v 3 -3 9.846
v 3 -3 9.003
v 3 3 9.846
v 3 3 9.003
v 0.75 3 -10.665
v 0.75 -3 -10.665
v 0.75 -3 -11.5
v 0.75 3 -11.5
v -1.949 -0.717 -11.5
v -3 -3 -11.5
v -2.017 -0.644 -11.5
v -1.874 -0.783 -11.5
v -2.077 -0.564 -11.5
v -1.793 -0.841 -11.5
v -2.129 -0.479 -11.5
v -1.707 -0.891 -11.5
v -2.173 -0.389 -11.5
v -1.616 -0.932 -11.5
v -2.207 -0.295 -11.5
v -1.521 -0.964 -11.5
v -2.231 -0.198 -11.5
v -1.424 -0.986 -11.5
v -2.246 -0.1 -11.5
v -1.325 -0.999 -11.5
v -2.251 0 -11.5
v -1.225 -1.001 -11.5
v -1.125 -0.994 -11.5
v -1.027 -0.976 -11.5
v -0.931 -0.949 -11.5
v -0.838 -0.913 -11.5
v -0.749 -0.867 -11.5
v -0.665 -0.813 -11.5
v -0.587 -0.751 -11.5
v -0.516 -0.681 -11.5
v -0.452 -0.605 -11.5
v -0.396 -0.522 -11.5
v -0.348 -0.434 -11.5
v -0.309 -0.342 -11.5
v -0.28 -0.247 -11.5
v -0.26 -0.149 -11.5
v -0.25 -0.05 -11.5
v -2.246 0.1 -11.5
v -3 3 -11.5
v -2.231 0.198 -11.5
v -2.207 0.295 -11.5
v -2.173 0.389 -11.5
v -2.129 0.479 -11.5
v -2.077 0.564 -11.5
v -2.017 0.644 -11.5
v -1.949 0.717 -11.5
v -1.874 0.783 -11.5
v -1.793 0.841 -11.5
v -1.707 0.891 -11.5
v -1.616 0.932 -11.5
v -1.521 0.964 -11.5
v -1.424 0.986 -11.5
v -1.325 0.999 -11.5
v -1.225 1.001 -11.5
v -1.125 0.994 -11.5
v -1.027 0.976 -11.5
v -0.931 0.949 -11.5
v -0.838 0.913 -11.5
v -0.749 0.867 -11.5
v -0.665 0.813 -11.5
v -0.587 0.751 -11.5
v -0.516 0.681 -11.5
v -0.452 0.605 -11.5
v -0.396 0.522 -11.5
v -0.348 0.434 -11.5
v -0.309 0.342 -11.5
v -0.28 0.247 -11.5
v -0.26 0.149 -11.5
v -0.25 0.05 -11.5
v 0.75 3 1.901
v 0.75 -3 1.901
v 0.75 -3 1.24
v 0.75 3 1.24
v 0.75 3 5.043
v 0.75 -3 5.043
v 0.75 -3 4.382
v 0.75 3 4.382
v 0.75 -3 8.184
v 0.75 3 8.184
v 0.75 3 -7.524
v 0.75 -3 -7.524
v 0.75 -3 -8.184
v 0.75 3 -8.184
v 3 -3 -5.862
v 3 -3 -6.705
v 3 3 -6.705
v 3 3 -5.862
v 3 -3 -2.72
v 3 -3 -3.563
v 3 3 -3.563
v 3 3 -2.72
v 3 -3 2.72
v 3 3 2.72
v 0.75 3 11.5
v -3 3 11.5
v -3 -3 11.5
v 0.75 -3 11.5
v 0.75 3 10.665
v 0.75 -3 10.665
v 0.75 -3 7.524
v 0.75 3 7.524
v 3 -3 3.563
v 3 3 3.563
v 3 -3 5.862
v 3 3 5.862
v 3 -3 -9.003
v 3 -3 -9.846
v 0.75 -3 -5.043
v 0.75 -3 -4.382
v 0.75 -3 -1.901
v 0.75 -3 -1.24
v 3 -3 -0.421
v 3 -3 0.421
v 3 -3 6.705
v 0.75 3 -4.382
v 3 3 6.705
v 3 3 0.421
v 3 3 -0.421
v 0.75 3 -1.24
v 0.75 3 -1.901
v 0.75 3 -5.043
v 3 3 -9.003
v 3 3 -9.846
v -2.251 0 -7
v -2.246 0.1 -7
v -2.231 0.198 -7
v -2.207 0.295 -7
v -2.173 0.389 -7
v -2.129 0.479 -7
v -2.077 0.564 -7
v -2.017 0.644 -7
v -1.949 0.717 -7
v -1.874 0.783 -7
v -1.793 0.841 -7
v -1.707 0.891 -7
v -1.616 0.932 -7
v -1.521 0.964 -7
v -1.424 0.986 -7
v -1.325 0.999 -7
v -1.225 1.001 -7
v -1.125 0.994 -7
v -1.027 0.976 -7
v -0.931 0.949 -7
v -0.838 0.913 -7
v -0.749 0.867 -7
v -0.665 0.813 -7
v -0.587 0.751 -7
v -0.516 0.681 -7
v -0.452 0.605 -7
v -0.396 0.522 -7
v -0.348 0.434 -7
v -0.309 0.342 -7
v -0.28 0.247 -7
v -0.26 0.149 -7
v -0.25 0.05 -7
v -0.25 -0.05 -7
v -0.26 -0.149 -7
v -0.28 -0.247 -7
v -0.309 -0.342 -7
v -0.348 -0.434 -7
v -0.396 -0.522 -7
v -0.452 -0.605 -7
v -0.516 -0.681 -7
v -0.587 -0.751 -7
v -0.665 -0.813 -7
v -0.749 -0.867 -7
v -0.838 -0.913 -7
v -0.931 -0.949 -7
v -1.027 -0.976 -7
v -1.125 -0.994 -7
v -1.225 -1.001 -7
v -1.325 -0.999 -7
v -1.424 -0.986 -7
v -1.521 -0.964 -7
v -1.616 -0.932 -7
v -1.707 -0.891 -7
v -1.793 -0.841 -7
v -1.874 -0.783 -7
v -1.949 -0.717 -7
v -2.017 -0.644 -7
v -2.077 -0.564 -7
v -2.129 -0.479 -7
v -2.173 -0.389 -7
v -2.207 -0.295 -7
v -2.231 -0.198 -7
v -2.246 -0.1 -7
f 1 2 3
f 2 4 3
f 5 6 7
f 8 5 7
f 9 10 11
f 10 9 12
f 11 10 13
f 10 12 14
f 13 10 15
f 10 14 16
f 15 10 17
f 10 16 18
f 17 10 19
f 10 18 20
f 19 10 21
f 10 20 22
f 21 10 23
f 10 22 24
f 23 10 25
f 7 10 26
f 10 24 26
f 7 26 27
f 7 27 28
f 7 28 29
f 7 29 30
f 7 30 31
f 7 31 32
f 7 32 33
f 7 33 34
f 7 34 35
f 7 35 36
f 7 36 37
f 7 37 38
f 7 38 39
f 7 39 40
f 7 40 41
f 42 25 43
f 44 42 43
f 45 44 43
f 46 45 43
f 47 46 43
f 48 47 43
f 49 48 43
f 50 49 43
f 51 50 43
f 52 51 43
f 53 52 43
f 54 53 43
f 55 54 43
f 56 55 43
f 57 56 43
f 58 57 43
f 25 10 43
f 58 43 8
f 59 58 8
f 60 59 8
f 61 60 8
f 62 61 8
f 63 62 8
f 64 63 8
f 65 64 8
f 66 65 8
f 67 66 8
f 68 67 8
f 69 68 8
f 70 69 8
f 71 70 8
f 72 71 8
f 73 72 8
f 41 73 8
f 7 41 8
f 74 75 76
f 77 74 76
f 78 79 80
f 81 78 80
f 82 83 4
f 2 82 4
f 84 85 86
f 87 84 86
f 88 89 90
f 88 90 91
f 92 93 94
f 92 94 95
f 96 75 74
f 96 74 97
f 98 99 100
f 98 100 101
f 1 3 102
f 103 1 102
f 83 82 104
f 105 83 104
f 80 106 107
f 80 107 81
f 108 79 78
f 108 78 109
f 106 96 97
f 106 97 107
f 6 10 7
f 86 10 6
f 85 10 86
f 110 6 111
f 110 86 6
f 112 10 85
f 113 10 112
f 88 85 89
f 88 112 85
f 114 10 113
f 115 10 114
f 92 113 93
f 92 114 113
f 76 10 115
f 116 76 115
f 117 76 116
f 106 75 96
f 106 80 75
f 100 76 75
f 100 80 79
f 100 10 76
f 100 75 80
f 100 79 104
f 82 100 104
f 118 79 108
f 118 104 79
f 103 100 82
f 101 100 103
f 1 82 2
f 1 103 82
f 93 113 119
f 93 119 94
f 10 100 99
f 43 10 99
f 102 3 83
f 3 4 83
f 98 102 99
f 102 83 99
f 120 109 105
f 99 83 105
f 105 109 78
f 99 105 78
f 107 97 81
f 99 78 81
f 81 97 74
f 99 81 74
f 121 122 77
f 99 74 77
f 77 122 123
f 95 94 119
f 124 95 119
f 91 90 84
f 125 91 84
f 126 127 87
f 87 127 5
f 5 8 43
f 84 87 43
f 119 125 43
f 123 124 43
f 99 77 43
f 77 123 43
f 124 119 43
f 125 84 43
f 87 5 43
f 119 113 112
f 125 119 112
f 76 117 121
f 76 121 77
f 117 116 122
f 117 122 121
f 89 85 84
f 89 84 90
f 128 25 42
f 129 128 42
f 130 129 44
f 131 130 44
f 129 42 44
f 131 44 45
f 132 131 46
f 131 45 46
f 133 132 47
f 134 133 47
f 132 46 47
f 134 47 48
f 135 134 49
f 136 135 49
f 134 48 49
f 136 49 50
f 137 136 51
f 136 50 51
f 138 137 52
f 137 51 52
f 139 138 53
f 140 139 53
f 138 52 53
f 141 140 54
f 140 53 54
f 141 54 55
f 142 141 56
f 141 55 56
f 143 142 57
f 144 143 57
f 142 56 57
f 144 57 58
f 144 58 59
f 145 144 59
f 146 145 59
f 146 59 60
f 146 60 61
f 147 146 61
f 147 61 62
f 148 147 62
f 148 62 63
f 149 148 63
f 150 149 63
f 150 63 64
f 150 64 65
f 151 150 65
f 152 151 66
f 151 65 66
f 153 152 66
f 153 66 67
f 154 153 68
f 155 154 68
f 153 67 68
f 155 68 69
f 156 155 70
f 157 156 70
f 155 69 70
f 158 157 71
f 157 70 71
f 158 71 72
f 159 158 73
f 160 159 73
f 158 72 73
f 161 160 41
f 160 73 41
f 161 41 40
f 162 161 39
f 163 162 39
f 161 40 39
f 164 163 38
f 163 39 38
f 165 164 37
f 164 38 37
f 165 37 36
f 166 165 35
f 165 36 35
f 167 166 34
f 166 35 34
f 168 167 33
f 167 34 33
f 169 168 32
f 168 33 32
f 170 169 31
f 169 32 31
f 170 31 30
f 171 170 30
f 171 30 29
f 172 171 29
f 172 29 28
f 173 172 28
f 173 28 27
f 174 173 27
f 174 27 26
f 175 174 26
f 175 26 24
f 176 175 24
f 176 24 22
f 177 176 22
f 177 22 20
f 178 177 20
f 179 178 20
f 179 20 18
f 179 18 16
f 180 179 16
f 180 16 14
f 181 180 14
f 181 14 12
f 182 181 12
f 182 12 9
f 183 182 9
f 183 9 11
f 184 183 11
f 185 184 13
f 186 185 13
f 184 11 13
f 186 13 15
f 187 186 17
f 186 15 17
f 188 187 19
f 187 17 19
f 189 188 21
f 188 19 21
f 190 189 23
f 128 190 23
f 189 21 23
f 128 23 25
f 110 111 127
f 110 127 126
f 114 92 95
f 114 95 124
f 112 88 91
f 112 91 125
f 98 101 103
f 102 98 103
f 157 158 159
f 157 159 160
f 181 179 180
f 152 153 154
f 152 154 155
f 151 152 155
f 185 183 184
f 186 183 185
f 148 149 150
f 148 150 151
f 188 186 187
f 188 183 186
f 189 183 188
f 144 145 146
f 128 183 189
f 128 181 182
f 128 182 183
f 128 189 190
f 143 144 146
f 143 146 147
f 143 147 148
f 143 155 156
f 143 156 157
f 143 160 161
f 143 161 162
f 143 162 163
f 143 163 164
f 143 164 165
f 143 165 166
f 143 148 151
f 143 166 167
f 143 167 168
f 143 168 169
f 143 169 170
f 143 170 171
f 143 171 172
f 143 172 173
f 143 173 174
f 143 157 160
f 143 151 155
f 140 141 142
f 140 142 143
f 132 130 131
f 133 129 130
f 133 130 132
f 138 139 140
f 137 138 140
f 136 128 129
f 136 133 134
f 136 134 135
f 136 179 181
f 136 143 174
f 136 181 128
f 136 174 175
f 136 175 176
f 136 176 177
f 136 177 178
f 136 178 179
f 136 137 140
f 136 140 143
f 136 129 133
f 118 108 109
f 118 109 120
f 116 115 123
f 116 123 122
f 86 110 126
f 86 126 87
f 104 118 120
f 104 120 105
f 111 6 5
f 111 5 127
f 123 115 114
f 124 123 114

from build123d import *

# Parameters (mm, degrees)
SKETCH10_W                = 6
SKETCH10_H                = 6
RACK_BAR_DEPTH            = 11.5
RACK_ROOT_STEP_DEPTH      = 13.257650672
RACK_ROOT_STEP_DEPTH_BACK = 13.257650672
SKETCH12_W                = 2.75
SKETCH12_H                = 24
RACK_TEETH_DEPTH          = 3
SKETCH15_R                = 1.001320398
CUT_EXTRUDE2_DEPTH        = 4.5


with BuildPart() as part:
    # Sketch10 → RACK_BAR (new, symmetric)
    with BuildSketch(Plane.XY):
        Rectangle(SKETCH10_W, SKETCH10_H)
    extrude(amount=RACK_BAR_DEPTH, both=True)

    # Sketch12 → RACK_ROOT_STEP (cut, two sides: drawn at the far end of the back side and taken through both)
    with BuildSketch(Plane(origin=(0, 0, 0), x_dir=(1, 0, 0), z_dir=(0, 1, 0)).offset(-RACK_ROOT_STEP_DEPTH_BACK)):
        with Locations((2.125, 0)):
            Rectangle(SKETCH12_W, SKETCH12_H)
    extrude(amount=RACK_ROOT_STEP_DEPTH + RACK_ROOT_STEP_DEPTH_BACK, mode=Mode.SUBTRACT)

    # Sketch13 → RACK_TEETH (add, symmetric)
    with BuildSketch(Plane(origin=(0, 0, 0), x_dir=(1, 0, 0), z_dir=(0, 1, 0))):
        Polygon((0.5, 1.3314), (3, 0.4214), (3, -0.4214), (0.5, -1.3314), align=None)
        Polygon((0.5, 4.473), (3, 3.563), (3, 2.7202), (0.5, 1.8102), align=None)
        Polygon((0.5, -1.8102), (3, -2.7202), (3, -3.563), (0.5, -4.473), align=None)
        Polygon((0.5, 7.6146), (3, 6.7046), (3, 5.8618), (0.5, 4.9518), align=None)
        Polygon((0.5, -4.9518), (3, -5.8618), (3, -6.7046), (0.5, -7.6146), align=None)
        Polygon((0.5, 10.7562), (3, 9.8462), (3, 9.0034), (0.5, 8.0934), align=None)
        Polygon((0.5, -8.0934), (3, -9.0034), (3, -9.8462), (0.5, -10.7562), align=None)
    extrude(amount=RACK_TEETH_DEPTH, both=True)

    # Sketch15 → Cut-Extrude2 (cut)
    with BuildSketch(Plane(origin=(0, 0, -11.5), x_dir=(-1, 0, 0), z_dir=(0, 0, -1))):
        with Locations((1.25, 0)):
            Circle(SKETCH15_R)
    extrude(amount=-CUT_EXTRUDE2_DEPTH, mode=Mode.SUBTRACT)


solid = part.part
